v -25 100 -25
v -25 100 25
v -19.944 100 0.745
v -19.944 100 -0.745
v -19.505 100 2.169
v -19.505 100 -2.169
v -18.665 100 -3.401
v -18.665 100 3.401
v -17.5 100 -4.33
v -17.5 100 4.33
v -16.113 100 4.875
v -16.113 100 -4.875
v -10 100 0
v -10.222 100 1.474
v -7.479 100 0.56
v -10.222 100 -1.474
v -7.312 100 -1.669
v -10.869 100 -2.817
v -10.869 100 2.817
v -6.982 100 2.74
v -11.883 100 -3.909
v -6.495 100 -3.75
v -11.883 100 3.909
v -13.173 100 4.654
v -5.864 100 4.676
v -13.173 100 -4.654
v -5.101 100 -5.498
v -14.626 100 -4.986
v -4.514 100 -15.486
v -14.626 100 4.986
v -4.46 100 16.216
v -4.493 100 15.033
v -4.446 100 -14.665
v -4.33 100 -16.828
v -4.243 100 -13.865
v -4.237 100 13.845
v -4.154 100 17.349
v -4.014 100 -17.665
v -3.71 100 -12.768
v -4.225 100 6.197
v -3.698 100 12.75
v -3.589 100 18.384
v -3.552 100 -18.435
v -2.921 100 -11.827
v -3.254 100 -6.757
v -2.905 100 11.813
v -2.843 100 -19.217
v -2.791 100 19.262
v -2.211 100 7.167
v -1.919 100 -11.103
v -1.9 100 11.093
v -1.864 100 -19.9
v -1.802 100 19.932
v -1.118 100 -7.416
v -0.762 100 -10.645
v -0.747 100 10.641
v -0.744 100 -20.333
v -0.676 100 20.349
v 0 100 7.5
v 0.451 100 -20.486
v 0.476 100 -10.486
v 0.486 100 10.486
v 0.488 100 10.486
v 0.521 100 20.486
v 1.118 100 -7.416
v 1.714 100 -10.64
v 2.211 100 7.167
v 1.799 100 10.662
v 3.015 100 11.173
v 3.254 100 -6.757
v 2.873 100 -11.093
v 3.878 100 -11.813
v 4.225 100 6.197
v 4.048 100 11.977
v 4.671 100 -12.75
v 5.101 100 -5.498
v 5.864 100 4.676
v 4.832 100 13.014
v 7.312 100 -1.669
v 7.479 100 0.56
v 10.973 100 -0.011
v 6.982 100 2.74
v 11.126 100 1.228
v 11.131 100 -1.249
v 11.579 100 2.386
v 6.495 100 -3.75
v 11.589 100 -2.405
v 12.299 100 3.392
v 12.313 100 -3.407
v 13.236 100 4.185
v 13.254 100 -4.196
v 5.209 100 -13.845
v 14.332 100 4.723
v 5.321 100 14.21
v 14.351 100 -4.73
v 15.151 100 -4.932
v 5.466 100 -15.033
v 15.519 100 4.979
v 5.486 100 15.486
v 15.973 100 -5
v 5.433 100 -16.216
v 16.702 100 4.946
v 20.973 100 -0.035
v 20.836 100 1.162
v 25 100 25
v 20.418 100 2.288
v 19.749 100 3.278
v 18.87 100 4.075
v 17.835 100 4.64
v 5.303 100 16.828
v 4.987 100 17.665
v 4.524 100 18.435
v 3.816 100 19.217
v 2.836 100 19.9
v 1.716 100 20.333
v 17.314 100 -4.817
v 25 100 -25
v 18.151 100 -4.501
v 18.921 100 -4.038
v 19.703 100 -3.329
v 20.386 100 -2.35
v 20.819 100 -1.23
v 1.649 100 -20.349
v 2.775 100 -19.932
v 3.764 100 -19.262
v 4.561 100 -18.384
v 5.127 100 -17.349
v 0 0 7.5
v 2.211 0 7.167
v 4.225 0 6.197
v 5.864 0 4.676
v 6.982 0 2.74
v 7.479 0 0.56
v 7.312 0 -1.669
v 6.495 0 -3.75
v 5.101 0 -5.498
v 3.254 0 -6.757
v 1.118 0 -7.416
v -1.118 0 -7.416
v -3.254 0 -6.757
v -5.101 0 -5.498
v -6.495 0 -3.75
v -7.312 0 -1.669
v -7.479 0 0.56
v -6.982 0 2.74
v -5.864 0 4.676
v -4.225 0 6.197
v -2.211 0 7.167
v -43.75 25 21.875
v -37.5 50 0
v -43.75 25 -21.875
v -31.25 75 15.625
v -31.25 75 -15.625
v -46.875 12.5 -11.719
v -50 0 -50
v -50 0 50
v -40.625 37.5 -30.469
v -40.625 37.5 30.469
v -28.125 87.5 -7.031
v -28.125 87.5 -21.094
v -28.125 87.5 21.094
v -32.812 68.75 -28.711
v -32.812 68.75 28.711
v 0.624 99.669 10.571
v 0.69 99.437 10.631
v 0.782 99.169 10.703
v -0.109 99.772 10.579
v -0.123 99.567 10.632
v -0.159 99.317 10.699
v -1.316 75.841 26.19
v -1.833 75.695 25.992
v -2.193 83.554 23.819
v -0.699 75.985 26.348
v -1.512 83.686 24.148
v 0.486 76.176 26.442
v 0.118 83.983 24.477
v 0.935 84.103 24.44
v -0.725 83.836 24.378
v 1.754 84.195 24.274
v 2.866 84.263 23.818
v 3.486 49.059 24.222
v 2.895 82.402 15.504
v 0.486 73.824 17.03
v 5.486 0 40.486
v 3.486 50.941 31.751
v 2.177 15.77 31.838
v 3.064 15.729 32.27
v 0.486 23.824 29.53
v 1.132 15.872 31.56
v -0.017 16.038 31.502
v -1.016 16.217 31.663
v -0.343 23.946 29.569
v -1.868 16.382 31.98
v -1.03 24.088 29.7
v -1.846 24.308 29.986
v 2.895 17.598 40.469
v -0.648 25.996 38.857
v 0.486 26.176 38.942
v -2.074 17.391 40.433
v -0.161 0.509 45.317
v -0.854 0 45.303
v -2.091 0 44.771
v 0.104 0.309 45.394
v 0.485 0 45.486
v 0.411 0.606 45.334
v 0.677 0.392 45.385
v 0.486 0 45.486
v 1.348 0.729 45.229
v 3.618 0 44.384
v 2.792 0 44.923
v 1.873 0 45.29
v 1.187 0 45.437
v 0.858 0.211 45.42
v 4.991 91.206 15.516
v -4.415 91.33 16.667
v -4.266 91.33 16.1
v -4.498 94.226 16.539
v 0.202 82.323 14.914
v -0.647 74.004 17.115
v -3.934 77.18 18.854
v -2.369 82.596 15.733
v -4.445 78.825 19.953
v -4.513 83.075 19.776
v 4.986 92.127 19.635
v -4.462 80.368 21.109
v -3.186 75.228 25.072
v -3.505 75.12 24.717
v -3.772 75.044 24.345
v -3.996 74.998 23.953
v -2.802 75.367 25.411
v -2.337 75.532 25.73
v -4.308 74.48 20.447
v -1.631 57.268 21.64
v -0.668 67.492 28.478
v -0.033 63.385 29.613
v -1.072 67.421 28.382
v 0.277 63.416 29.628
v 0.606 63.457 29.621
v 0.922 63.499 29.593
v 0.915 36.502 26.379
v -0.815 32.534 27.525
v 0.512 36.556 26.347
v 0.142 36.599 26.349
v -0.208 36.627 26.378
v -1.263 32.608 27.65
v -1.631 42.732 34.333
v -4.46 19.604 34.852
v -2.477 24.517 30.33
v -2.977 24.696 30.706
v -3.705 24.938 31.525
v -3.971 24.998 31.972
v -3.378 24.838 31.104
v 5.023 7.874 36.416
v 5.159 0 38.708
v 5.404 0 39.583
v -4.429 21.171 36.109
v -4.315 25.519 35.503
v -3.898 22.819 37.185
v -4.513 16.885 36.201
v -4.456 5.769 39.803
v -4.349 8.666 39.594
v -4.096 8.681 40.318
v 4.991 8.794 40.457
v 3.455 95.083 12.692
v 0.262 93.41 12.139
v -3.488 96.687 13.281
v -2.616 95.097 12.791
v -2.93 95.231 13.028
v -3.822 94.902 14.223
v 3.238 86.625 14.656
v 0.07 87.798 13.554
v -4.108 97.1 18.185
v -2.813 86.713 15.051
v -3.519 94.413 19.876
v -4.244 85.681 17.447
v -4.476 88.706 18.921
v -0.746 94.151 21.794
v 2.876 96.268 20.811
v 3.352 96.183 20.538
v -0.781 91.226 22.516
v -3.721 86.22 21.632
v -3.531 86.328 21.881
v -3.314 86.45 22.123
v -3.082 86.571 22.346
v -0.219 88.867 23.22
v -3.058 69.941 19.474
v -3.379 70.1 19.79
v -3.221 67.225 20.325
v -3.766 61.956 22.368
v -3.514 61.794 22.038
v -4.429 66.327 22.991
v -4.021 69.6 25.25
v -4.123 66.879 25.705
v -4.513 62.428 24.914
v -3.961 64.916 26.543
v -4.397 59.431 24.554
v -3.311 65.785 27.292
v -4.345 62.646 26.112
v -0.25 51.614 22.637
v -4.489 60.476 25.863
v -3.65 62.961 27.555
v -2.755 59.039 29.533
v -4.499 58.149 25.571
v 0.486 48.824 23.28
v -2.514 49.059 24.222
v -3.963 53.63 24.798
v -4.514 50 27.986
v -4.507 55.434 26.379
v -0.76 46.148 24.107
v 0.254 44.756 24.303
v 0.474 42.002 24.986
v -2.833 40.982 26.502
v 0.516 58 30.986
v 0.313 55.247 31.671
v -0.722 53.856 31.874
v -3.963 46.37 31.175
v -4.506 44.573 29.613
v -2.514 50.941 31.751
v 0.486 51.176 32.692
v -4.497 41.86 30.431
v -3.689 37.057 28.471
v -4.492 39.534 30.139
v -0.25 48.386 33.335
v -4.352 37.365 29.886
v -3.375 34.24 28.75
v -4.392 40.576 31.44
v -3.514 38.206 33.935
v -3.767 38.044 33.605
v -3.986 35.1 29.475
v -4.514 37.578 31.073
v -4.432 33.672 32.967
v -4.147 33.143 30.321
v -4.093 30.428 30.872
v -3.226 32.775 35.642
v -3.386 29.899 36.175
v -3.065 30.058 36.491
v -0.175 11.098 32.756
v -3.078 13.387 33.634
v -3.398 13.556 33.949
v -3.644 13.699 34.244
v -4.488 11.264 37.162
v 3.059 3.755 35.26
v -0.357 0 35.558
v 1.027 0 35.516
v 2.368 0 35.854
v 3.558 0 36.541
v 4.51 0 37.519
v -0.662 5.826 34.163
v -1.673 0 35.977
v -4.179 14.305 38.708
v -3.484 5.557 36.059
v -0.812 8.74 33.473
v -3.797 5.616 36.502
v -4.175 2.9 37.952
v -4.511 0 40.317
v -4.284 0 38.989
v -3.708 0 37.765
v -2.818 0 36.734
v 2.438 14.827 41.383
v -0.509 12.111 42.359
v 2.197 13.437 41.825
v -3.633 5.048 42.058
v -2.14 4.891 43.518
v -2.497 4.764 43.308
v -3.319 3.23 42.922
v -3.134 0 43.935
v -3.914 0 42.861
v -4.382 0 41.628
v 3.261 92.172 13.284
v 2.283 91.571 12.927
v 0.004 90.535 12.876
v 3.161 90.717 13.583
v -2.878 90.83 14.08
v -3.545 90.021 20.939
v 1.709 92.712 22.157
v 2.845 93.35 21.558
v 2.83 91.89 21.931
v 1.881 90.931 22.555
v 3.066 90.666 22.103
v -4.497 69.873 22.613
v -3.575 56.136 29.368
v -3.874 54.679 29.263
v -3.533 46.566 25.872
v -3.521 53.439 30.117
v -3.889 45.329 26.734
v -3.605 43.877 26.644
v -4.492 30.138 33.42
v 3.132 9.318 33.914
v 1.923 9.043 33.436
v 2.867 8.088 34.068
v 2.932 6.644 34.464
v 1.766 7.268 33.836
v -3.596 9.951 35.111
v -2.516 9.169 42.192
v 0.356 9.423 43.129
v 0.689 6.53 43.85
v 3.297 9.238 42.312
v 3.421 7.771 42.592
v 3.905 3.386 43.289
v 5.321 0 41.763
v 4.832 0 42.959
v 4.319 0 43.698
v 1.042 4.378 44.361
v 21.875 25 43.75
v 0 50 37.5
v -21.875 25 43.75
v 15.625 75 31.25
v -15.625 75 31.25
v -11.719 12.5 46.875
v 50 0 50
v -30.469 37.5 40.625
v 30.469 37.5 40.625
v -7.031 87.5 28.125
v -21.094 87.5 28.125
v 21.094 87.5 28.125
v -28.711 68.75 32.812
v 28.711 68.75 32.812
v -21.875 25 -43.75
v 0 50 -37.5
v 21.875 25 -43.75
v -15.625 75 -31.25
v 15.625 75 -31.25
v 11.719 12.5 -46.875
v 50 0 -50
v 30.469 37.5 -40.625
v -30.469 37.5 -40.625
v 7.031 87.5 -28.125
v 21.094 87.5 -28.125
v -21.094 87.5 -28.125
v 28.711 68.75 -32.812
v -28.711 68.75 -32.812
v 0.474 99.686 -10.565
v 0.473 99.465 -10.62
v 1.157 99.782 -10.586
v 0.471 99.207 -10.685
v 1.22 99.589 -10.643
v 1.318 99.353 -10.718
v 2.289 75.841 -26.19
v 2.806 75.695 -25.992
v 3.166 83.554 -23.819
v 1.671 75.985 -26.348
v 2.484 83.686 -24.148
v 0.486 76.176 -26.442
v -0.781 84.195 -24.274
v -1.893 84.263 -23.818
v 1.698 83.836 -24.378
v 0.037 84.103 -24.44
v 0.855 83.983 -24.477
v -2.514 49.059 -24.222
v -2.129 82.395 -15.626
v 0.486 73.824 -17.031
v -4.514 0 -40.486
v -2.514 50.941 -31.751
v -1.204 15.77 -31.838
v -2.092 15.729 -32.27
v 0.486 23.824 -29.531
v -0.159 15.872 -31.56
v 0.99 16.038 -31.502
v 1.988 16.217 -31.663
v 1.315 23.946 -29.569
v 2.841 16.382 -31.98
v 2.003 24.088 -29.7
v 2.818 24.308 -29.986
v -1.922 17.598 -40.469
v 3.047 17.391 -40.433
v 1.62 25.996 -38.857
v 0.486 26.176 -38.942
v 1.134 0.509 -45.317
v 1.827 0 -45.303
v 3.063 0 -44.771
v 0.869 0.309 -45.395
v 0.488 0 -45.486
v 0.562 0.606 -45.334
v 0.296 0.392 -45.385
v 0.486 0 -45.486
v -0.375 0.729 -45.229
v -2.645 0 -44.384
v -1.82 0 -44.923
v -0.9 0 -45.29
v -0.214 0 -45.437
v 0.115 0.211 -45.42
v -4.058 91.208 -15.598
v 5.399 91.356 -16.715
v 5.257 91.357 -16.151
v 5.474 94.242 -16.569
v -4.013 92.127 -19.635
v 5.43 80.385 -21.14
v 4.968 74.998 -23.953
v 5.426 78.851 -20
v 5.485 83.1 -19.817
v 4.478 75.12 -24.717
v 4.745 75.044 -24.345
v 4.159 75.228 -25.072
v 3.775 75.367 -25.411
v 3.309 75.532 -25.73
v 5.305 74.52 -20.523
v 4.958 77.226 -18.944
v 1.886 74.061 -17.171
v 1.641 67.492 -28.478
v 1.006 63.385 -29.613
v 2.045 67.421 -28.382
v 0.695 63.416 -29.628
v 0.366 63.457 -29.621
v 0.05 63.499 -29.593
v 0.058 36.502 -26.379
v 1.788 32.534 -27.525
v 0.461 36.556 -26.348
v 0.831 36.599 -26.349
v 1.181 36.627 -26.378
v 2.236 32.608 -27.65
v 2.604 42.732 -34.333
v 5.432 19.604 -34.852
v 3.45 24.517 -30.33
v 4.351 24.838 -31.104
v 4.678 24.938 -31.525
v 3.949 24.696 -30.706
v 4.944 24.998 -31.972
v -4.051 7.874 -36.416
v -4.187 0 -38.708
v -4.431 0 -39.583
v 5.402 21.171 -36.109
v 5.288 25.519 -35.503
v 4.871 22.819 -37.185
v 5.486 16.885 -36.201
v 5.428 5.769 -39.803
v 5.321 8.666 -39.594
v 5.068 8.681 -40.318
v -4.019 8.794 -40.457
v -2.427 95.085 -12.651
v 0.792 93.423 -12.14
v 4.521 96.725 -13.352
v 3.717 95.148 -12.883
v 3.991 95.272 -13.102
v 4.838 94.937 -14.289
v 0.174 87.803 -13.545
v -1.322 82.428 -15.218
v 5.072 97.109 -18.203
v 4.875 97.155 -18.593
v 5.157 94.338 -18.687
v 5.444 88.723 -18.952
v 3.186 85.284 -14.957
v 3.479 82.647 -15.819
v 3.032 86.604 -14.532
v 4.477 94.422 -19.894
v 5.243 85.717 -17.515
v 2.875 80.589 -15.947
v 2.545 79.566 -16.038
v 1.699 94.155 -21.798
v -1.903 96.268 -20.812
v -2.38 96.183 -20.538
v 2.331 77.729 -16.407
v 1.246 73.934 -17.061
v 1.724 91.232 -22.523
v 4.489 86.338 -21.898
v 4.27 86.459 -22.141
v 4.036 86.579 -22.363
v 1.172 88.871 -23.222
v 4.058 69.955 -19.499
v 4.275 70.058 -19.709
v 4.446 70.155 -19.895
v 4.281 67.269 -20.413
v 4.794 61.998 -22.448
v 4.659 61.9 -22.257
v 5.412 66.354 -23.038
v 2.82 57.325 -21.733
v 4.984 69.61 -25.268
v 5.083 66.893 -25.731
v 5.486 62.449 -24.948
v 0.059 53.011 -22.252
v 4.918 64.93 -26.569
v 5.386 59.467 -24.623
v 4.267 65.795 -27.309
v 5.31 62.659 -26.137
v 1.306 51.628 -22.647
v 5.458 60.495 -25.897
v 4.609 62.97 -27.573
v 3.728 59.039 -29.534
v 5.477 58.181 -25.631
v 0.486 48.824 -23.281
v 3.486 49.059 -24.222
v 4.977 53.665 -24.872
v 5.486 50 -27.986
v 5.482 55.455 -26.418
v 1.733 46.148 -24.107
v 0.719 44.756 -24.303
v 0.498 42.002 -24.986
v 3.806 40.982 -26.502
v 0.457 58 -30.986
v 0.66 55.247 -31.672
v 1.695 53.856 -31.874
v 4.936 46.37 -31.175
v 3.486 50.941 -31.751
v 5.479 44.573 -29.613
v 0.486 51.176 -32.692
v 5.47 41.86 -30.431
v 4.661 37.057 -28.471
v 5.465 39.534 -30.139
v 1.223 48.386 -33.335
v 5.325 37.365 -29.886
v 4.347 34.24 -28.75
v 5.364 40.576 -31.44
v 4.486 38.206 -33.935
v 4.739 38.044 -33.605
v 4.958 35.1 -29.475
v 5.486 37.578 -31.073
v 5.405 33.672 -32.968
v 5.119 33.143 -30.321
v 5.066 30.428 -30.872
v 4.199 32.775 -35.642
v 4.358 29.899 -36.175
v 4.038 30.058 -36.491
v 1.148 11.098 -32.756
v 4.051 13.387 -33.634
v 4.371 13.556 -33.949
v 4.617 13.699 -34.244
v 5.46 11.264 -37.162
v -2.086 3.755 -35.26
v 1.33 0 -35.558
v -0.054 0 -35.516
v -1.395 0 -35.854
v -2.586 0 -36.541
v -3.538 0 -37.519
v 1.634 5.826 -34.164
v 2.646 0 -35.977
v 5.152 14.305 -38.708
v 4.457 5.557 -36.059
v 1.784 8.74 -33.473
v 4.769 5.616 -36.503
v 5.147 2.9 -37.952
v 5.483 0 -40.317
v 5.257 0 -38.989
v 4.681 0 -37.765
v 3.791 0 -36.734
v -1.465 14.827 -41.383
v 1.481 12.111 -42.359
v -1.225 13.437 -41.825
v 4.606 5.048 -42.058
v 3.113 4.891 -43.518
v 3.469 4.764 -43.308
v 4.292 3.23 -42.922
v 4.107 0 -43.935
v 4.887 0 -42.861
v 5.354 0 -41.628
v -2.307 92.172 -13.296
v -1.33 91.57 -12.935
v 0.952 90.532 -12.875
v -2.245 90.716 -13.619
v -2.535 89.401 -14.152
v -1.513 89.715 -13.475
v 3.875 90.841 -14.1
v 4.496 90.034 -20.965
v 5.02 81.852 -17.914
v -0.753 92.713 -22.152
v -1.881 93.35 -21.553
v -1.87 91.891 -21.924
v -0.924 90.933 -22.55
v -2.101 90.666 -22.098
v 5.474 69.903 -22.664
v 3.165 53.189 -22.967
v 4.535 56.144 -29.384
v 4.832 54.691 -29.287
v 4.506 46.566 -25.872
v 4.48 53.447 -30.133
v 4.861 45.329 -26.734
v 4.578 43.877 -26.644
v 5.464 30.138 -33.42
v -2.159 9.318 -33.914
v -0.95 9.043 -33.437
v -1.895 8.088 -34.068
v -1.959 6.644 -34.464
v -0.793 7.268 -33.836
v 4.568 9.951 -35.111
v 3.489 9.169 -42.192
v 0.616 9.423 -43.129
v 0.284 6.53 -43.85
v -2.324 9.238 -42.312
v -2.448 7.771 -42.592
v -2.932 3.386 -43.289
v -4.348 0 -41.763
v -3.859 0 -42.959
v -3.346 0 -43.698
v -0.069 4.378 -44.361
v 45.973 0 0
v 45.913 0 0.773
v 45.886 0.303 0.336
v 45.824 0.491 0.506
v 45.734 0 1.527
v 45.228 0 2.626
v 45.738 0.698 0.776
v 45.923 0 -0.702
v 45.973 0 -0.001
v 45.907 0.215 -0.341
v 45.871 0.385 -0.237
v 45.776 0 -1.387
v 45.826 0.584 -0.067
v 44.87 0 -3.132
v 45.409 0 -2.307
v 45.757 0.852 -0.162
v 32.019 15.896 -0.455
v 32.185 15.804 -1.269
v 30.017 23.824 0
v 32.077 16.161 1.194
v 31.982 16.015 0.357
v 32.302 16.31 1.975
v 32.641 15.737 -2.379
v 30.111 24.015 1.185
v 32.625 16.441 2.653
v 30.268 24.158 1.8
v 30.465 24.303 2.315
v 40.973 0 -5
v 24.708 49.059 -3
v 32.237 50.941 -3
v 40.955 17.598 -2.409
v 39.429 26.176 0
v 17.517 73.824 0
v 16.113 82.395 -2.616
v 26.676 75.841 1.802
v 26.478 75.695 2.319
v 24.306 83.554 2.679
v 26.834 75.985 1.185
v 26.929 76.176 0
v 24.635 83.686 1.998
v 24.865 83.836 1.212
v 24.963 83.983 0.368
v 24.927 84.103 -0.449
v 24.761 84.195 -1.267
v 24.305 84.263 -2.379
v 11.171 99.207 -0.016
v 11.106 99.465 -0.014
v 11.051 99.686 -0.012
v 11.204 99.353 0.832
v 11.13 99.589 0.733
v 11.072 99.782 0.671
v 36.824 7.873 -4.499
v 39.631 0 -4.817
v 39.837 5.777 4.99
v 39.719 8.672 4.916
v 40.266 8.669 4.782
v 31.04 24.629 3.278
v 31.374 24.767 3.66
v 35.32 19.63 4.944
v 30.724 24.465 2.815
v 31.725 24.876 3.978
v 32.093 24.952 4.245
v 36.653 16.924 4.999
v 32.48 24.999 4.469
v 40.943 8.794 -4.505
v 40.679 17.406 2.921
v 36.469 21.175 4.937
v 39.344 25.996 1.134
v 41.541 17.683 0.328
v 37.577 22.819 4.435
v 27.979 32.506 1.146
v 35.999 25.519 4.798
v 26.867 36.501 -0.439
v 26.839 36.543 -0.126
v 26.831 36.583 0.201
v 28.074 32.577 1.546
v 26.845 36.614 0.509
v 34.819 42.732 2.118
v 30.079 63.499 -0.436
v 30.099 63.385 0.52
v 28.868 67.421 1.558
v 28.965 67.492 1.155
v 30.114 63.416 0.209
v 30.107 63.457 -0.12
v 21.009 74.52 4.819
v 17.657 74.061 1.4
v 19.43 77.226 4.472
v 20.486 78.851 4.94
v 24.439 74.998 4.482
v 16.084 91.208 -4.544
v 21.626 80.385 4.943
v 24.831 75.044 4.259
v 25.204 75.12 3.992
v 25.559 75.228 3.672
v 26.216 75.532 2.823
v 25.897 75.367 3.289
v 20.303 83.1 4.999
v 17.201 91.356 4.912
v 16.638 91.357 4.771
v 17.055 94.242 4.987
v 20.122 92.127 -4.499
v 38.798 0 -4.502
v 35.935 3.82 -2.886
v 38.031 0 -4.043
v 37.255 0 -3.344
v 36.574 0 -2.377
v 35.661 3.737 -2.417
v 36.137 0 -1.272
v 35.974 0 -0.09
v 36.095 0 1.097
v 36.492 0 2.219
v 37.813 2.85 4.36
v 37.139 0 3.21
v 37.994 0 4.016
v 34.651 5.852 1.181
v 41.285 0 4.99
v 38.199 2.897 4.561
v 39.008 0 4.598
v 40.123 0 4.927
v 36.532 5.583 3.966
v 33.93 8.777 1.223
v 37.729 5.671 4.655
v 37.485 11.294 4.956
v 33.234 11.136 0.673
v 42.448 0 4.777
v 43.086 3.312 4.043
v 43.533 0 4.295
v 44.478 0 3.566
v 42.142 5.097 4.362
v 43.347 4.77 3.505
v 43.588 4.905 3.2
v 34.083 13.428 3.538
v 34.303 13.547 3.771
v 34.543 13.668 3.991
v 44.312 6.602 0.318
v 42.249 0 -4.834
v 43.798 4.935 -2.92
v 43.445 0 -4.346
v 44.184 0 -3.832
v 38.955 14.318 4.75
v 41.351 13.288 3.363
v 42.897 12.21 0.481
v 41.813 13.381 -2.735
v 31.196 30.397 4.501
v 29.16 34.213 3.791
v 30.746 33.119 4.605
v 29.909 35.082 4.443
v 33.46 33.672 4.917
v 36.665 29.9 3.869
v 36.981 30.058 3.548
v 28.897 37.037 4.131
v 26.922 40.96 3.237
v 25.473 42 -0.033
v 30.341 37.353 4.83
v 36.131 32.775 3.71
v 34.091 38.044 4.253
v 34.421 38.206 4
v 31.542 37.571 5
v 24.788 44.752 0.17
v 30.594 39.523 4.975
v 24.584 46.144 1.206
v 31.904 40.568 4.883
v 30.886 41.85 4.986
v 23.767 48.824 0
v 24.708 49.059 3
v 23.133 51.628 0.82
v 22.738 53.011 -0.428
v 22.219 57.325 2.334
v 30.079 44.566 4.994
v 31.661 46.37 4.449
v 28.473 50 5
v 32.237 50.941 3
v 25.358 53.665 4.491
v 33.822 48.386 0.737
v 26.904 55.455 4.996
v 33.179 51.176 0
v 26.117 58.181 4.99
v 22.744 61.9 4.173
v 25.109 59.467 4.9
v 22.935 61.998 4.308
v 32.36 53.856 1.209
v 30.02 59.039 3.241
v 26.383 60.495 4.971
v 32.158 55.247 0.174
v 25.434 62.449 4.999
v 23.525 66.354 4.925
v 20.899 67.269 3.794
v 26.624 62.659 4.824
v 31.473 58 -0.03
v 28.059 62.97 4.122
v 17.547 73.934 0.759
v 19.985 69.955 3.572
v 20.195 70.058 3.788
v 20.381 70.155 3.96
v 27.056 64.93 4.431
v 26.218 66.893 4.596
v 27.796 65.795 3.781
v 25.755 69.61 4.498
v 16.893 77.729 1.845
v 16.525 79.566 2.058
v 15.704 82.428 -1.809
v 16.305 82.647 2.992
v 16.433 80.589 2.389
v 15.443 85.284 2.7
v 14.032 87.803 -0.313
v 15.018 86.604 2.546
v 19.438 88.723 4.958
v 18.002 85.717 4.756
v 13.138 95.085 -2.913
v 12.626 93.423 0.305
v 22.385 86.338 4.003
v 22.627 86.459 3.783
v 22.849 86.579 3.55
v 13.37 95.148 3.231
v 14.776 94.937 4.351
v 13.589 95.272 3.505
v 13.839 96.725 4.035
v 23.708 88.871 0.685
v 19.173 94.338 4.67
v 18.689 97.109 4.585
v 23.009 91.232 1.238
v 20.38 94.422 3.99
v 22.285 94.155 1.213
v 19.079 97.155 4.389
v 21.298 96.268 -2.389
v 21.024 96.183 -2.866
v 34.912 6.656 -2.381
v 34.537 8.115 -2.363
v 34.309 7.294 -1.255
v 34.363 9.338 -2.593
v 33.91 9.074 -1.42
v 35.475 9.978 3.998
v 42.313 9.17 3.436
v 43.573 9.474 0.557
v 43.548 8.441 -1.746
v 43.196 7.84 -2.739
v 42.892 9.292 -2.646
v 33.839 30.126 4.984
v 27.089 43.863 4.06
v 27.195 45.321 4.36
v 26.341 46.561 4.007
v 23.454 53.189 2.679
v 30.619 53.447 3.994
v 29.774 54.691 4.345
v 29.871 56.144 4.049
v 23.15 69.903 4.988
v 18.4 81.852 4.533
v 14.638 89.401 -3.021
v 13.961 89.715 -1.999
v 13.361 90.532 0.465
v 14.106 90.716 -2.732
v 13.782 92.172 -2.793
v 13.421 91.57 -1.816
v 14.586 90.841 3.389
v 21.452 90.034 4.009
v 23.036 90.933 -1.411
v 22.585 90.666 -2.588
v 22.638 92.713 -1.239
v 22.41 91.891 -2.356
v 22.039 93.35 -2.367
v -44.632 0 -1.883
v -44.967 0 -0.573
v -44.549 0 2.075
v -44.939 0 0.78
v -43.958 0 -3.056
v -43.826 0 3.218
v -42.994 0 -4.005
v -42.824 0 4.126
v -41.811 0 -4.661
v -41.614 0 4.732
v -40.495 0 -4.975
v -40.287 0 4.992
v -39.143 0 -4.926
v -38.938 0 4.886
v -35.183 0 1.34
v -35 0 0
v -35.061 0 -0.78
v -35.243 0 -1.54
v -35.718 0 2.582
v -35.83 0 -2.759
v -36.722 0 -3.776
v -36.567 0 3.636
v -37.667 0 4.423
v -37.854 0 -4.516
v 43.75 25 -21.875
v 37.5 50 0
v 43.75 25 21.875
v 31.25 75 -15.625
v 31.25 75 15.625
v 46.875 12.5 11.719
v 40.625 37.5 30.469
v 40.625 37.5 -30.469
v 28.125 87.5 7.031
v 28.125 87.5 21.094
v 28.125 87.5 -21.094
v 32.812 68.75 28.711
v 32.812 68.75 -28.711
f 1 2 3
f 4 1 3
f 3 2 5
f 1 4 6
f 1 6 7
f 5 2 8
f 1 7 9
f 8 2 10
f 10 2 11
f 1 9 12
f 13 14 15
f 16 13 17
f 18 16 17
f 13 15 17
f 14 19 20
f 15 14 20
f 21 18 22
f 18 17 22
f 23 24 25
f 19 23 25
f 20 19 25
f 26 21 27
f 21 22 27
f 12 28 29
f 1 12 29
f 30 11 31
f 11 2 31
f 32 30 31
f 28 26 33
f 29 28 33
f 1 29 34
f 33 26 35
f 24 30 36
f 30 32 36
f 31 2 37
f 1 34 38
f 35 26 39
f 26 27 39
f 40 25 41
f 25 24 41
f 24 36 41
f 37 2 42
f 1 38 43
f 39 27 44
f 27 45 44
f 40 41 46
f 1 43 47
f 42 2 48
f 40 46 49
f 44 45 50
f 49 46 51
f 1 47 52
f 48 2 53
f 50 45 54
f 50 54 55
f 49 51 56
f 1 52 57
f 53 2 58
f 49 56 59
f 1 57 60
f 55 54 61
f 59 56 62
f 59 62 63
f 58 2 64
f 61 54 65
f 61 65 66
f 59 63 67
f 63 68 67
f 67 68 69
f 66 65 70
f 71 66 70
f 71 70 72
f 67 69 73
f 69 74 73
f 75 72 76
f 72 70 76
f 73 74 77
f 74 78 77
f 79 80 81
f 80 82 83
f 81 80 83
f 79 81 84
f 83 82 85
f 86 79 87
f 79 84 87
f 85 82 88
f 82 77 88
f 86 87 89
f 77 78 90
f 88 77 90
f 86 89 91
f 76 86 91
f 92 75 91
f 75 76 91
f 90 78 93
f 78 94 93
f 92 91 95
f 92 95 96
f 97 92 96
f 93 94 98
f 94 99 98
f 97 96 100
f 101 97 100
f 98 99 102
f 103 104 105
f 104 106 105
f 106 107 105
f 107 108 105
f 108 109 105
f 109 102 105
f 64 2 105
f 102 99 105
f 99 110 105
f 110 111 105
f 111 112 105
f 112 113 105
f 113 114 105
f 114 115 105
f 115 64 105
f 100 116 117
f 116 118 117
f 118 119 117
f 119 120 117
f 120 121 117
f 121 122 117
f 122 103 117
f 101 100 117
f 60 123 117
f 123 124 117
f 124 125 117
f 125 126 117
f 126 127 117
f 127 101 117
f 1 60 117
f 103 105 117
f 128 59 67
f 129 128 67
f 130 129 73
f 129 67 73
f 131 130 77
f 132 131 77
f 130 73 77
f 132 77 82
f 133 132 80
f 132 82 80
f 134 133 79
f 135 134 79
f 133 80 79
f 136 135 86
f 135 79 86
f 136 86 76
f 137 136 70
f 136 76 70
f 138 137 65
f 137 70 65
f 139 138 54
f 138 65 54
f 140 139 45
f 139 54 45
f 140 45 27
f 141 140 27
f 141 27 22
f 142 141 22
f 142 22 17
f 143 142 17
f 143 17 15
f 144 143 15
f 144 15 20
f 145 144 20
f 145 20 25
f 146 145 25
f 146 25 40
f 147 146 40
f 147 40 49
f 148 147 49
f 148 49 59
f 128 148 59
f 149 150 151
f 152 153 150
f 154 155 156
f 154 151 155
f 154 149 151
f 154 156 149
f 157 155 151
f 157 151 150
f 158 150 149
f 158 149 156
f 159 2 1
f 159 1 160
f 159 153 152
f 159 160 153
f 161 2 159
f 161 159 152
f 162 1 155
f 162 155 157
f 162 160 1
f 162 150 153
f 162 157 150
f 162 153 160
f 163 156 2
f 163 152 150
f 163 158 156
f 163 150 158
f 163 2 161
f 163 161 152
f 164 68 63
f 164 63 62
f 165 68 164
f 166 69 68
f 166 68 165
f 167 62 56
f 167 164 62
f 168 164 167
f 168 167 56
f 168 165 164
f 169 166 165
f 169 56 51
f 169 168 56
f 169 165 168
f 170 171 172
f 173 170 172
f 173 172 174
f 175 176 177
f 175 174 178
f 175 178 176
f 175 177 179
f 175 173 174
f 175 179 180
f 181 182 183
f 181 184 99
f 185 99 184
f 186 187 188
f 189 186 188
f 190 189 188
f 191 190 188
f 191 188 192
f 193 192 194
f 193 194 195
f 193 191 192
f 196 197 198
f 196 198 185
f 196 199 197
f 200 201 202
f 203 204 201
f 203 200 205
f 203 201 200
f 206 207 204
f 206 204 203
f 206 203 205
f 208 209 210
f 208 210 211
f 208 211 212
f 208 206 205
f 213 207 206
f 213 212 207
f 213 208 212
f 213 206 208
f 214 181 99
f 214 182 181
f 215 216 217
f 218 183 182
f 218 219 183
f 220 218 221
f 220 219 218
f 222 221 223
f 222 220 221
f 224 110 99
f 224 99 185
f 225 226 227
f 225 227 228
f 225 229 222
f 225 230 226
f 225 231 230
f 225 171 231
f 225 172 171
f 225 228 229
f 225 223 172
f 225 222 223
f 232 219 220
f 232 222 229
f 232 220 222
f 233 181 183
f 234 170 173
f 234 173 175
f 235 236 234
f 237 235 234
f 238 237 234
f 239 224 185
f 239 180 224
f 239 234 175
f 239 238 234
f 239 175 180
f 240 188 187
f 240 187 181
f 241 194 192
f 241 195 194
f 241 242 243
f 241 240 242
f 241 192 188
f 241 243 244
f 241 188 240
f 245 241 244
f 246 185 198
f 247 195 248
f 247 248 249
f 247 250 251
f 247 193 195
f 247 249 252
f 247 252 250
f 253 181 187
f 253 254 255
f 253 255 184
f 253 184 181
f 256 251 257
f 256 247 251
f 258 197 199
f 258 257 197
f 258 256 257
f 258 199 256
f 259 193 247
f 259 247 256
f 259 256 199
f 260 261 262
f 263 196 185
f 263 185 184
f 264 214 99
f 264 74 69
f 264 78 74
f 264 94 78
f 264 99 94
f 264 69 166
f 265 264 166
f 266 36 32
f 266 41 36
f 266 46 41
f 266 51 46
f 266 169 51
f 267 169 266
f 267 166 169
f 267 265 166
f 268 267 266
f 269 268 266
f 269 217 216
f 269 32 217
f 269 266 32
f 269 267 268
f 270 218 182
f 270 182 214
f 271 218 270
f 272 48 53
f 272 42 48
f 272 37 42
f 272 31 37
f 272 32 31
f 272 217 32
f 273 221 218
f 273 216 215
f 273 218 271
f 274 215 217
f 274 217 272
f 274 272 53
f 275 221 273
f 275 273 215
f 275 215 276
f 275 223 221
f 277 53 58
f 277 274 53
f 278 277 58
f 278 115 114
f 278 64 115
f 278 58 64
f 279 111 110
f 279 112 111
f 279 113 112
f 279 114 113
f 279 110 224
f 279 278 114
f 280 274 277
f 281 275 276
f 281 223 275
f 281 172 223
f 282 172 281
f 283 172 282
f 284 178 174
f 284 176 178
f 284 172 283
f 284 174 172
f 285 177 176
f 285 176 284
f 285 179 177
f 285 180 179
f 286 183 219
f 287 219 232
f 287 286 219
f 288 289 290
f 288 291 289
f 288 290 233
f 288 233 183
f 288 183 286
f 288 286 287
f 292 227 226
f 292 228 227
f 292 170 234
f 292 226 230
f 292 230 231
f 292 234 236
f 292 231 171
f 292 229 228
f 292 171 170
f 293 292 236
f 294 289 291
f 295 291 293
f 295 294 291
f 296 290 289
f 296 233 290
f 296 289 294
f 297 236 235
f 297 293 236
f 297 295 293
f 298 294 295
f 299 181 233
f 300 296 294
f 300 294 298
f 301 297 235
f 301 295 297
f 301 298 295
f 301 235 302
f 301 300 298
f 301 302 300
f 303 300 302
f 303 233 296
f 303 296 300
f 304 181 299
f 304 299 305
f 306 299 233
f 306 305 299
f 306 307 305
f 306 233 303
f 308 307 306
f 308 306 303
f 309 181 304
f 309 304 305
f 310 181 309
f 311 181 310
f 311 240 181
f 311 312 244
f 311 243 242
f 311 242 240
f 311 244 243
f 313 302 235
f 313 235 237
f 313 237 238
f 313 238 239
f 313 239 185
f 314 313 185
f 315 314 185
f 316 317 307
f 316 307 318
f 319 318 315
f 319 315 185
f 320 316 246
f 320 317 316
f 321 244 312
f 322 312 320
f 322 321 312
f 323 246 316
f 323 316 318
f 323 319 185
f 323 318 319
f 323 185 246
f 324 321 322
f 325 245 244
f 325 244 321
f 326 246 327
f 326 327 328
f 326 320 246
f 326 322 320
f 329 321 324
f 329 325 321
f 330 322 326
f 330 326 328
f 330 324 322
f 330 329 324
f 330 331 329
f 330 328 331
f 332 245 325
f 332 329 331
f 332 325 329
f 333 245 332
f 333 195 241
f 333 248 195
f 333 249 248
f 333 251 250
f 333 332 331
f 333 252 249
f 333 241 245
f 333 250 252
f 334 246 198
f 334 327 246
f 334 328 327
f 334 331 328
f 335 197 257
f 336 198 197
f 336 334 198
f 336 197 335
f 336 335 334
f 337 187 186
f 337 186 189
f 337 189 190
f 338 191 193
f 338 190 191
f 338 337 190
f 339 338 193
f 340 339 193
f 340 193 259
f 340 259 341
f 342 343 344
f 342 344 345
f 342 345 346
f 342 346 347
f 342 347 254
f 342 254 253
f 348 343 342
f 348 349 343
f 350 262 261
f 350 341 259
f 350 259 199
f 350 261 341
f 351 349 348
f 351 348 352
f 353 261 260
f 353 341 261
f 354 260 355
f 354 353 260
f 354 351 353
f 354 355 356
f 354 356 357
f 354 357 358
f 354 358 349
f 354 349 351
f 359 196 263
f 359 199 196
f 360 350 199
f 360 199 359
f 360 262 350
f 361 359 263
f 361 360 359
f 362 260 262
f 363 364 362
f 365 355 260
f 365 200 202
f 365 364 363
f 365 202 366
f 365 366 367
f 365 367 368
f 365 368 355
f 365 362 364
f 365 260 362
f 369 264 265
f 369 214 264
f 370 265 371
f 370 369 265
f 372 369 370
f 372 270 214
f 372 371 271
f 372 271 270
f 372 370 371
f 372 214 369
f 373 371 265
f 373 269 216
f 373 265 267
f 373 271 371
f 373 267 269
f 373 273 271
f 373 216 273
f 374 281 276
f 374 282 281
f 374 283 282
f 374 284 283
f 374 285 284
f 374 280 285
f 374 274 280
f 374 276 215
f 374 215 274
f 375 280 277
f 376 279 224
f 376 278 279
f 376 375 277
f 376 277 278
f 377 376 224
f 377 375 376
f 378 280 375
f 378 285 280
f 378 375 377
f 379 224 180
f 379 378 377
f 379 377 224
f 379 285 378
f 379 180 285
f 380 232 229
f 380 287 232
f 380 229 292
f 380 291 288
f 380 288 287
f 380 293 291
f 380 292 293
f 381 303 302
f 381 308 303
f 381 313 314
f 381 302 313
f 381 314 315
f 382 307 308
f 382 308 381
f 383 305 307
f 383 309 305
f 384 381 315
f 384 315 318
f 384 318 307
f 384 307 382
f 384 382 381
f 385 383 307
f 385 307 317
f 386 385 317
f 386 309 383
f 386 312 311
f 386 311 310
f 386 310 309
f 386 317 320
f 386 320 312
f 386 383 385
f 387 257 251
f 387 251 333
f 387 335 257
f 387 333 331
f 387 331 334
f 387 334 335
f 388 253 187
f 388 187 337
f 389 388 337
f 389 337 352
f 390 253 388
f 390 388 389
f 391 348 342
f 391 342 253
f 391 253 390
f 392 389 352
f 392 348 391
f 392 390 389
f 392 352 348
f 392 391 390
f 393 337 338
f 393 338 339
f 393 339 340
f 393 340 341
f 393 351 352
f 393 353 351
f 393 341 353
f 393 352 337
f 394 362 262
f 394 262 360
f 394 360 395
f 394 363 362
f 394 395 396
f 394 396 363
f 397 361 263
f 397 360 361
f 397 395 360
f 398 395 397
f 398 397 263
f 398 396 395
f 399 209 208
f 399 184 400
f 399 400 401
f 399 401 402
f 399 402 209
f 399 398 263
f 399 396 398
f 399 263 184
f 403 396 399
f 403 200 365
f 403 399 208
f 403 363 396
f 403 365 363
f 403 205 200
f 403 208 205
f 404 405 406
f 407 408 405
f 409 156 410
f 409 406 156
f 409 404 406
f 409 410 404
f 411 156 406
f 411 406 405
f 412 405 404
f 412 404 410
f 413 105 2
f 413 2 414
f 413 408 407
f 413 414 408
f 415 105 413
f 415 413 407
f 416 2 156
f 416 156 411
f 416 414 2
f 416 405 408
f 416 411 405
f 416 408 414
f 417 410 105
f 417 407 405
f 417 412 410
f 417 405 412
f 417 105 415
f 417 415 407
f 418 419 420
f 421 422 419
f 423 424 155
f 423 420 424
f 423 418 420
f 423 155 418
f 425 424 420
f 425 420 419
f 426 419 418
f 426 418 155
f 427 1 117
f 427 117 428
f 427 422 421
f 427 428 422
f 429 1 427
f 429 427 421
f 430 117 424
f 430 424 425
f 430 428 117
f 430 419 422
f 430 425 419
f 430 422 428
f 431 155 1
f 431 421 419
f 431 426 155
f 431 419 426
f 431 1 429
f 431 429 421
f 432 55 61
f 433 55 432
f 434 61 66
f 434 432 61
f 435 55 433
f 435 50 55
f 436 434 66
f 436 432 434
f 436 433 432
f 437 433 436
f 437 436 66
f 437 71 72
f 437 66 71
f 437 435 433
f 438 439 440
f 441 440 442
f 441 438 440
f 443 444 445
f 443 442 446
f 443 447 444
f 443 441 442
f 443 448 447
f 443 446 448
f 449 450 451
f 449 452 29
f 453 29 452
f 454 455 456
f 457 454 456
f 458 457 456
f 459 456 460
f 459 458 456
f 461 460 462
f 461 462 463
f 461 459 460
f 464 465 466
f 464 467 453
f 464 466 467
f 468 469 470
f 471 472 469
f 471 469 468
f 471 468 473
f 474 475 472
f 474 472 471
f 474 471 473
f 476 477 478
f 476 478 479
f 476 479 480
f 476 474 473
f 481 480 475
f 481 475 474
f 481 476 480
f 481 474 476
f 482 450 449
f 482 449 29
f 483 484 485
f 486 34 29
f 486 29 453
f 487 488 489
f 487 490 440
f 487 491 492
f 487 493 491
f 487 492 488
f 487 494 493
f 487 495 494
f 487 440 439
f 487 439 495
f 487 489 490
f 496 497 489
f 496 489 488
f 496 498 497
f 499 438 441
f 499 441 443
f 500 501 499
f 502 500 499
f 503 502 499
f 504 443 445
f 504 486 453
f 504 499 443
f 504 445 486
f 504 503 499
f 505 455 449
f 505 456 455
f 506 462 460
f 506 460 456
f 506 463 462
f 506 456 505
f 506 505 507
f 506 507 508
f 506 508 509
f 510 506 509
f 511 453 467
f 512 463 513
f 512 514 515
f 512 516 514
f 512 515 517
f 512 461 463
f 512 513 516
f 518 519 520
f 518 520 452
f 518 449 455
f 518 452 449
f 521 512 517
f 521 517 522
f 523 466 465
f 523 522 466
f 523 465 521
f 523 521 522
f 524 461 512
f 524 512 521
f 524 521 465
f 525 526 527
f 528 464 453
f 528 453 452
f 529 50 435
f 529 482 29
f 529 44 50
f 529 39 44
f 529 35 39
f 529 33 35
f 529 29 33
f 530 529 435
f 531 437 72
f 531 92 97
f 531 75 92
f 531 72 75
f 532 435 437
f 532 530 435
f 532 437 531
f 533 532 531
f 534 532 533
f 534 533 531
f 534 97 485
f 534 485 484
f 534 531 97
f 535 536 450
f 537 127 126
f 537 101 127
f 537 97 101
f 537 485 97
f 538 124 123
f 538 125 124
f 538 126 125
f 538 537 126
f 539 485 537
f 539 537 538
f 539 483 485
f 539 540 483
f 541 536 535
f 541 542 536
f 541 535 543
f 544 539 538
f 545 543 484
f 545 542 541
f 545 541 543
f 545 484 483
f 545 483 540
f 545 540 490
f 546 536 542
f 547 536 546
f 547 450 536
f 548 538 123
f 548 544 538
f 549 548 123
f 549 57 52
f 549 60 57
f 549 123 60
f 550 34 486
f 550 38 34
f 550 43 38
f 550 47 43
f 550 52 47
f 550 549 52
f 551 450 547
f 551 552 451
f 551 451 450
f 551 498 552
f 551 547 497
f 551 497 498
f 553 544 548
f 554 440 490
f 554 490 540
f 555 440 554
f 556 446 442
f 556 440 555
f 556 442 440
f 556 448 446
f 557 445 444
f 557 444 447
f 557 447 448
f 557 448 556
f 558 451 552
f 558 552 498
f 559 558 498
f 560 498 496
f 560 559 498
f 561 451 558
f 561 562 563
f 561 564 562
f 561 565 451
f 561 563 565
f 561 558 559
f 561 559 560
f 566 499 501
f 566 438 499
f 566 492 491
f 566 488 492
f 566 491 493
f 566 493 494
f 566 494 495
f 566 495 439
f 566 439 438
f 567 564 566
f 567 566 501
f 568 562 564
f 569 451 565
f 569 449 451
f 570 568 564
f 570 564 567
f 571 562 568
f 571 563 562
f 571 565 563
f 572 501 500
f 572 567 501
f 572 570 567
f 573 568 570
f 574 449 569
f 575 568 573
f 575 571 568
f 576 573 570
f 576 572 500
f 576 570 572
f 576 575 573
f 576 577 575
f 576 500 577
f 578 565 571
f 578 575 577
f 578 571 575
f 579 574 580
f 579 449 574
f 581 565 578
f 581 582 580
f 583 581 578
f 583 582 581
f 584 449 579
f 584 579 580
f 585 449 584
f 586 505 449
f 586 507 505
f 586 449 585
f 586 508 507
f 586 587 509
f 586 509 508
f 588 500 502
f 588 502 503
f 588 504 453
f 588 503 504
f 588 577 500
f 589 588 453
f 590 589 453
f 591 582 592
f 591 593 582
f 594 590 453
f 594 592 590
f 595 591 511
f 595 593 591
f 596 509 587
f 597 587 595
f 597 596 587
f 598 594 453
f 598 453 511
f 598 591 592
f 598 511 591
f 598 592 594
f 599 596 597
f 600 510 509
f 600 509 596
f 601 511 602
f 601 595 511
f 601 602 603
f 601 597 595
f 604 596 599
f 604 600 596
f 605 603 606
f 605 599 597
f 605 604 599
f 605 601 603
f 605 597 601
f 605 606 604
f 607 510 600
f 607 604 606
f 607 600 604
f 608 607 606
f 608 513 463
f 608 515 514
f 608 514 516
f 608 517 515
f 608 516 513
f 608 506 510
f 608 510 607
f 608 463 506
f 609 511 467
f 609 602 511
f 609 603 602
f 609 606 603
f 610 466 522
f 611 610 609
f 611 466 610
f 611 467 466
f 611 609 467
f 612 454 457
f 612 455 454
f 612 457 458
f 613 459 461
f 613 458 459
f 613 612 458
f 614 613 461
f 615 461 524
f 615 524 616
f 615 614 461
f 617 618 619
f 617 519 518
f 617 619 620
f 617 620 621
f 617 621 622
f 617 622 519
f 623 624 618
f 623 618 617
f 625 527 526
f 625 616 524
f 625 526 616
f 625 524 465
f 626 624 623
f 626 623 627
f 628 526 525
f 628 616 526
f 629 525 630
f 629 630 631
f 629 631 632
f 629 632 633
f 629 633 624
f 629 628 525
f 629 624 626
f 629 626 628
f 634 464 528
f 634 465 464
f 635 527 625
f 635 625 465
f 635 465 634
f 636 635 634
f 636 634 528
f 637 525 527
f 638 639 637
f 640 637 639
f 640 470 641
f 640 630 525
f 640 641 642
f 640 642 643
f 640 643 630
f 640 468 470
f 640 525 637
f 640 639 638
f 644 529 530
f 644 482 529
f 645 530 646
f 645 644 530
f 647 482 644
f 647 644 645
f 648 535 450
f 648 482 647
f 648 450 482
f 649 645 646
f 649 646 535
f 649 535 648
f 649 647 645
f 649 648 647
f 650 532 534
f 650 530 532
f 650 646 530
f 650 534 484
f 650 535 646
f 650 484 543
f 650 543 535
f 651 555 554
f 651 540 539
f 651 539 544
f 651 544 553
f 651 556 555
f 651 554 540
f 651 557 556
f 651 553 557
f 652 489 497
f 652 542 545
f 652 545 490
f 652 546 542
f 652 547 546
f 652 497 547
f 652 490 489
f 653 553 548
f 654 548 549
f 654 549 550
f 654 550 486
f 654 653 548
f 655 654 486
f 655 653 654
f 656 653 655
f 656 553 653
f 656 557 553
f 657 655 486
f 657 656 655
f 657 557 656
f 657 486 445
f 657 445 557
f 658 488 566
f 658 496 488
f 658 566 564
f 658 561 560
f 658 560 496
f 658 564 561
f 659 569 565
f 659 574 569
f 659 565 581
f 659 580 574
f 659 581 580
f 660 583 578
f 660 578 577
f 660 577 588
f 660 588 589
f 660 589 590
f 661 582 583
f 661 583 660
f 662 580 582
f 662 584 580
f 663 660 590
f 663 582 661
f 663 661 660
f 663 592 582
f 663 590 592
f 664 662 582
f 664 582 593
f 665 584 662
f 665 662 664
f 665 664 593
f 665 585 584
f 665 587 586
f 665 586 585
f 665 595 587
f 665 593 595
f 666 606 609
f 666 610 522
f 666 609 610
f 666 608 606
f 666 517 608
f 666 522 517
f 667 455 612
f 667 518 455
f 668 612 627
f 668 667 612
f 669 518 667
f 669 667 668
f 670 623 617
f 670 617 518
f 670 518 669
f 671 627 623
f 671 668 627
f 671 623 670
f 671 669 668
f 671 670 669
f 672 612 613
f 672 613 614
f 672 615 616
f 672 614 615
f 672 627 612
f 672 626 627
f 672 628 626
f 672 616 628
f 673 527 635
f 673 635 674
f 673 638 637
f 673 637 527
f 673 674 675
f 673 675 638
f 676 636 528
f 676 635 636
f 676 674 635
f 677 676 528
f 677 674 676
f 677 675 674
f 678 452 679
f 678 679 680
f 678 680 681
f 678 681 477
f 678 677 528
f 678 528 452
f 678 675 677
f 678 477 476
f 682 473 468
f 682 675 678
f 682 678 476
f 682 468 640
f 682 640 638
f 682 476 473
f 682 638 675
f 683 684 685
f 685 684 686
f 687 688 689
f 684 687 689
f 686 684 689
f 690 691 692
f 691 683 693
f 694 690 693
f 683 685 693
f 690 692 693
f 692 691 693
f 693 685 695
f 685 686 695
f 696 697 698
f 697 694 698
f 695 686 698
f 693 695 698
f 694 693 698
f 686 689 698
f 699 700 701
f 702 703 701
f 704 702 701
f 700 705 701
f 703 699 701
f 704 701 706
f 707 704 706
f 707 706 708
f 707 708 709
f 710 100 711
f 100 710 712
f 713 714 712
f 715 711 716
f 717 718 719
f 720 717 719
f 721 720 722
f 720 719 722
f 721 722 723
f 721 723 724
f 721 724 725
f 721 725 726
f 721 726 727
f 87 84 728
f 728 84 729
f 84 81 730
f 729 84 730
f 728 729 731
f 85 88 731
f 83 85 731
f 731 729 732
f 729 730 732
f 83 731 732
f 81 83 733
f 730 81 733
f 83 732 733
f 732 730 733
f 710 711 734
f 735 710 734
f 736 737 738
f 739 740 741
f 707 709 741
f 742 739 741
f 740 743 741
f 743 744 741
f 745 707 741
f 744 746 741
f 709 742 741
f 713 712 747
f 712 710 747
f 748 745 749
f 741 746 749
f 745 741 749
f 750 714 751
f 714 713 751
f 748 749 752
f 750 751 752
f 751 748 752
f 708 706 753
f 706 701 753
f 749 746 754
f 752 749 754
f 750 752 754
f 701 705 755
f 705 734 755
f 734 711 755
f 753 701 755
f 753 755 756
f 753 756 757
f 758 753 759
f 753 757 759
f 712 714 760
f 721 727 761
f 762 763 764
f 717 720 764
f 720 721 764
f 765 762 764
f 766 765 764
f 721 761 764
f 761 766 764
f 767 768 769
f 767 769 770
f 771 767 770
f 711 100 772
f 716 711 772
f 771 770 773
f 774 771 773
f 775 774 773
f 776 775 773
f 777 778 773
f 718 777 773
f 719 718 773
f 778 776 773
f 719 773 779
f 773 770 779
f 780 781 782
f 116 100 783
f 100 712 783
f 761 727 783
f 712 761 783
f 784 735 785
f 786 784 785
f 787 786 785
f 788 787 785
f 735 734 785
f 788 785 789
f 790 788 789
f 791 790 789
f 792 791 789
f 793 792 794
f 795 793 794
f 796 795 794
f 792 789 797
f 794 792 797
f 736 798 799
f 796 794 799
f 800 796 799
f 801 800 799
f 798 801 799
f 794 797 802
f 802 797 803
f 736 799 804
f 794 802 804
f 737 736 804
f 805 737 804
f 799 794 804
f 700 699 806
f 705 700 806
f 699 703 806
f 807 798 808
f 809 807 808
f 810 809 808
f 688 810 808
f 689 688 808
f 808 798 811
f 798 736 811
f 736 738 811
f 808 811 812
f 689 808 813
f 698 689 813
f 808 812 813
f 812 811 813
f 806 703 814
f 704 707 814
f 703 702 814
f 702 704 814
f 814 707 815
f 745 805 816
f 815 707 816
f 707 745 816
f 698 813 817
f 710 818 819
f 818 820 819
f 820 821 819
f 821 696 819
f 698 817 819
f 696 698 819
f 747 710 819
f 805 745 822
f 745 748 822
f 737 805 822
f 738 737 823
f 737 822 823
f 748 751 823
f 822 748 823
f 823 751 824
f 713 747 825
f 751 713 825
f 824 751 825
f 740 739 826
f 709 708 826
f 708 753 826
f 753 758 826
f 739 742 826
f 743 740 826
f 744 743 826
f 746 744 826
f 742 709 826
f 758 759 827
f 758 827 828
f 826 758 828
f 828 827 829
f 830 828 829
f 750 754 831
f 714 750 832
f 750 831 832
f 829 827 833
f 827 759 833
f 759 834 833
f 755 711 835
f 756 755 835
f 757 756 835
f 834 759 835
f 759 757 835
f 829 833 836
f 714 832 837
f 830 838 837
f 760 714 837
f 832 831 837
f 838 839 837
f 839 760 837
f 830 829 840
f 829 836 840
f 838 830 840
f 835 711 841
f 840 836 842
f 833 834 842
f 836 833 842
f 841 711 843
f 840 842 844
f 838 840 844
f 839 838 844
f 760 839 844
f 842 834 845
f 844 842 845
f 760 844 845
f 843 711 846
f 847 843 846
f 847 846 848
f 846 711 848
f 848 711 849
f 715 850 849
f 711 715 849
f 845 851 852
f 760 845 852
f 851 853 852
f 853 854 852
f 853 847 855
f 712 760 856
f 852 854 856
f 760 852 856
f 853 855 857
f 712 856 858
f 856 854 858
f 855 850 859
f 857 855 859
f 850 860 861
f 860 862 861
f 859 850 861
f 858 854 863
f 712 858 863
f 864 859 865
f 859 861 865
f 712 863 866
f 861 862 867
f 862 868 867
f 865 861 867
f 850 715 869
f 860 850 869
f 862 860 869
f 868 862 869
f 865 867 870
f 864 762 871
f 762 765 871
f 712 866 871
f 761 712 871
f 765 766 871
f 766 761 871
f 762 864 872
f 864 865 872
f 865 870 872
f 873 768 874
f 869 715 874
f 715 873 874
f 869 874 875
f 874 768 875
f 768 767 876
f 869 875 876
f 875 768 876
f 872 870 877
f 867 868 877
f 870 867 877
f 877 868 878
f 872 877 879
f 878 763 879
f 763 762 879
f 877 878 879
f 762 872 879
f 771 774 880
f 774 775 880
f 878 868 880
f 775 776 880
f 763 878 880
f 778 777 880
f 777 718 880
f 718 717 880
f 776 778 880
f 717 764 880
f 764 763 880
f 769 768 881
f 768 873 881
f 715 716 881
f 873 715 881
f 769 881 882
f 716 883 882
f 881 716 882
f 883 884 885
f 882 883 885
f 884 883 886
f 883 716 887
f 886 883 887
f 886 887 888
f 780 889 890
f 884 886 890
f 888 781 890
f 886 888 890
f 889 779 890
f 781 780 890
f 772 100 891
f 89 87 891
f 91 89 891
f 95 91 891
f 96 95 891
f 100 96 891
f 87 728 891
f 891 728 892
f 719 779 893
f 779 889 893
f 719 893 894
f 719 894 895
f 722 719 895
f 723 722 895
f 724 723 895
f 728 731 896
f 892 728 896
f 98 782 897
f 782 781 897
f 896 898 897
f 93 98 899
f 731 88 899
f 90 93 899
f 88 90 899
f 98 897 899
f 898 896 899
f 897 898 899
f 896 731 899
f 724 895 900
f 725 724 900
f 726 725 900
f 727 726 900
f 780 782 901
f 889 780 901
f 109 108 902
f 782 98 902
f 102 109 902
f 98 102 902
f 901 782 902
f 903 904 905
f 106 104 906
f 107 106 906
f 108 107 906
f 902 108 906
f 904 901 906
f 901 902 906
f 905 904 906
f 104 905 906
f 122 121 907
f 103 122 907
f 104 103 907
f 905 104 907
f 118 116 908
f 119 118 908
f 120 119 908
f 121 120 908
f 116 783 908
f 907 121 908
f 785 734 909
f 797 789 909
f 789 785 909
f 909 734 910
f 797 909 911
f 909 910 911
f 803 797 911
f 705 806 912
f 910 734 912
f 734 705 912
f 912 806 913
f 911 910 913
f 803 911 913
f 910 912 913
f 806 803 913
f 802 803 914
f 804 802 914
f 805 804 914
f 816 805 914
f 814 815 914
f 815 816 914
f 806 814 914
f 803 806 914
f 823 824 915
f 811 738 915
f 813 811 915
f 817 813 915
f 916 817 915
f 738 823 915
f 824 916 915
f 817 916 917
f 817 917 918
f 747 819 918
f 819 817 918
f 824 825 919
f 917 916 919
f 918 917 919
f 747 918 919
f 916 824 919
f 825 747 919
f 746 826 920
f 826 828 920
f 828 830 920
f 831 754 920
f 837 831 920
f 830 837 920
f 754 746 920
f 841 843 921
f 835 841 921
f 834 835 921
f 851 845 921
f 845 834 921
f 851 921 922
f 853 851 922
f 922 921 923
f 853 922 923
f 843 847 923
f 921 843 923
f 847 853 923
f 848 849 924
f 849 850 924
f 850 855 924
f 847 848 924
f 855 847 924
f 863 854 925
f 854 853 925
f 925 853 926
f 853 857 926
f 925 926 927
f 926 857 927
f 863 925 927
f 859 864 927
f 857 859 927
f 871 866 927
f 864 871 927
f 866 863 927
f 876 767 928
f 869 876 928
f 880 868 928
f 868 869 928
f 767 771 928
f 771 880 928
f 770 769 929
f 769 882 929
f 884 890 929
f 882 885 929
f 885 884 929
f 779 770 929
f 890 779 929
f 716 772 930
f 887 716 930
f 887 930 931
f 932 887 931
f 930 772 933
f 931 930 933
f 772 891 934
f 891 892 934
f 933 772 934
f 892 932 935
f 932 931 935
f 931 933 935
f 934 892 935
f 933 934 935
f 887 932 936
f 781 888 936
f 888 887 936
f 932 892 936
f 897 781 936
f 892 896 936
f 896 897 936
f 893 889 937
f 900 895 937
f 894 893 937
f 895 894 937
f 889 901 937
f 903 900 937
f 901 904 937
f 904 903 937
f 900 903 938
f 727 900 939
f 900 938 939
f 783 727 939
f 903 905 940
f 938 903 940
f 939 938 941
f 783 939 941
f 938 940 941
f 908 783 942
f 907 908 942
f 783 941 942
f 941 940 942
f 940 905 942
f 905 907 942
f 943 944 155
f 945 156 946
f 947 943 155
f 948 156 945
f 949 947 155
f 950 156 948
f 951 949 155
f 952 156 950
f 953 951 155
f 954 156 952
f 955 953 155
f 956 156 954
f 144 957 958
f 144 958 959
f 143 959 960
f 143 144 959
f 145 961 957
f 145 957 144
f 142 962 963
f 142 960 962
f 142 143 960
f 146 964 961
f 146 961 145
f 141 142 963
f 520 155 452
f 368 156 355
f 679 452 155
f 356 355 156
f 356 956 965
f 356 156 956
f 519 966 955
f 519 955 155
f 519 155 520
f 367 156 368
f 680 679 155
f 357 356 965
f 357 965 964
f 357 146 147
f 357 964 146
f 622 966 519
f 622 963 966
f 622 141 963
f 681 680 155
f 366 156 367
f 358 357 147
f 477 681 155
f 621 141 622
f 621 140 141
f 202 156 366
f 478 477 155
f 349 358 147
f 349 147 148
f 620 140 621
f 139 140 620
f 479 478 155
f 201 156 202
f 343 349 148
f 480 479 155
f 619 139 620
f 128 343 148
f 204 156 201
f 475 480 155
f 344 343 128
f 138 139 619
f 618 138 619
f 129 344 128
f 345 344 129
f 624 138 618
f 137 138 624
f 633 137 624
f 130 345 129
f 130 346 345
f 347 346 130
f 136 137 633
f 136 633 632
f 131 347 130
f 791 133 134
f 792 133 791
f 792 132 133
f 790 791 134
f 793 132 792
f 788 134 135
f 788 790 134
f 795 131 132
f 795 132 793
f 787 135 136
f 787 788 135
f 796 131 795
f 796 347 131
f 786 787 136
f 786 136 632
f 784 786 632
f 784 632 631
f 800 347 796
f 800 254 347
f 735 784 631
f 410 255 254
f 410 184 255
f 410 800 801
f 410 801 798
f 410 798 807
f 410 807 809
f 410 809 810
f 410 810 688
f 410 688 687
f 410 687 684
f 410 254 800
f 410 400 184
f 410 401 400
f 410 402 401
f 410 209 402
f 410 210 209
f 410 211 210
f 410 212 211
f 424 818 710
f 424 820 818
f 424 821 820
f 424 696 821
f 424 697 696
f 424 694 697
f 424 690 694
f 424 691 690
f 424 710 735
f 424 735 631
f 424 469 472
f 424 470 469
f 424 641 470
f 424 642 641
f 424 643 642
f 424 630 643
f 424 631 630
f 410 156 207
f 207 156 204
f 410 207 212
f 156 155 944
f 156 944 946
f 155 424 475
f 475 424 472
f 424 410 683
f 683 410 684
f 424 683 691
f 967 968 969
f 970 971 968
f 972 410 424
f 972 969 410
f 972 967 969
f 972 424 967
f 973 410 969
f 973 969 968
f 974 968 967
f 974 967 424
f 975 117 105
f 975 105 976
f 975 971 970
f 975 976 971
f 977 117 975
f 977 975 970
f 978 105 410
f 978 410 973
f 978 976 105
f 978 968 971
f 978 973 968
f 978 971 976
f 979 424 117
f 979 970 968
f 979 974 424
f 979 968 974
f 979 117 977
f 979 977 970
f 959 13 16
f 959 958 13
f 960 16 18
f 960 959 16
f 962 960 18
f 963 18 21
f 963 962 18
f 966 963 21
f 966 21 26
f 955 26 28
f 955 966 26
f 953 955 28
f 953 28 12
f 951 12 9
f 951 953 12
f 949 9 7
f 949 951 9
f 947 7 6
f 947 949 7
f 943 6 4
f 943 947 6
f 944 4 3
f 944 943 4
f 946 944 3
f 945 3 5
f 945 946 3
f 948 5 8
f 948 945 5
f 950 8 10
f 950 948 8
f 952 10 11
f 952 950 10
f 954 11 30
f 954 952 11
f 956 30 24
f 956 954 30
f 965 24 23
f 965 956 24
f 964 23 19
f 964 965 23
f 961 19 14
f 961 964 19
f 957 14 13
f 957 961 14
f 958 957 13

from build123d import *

# Parameters (mm, degrees)
SKETCH4_R           = 5
CIRPATTERN2_START   = -11.032054127
CIRPATTERN2_DEPTH   = 105.5029968
CIRPATTERN2_START_2 = -94.352977596
CIRPATTERN2_2_DEPTH = 105.502996925
CIRPATTERN2_START_3 = -11.032068283
CIRPATTERN2_3_DEPTH = 105.502996925
SKETCH9_R           = 7.5
CUT_EXTRUDE1_DEPTH  = 123.474487302


# Read off the part's stored shape, not the designer's step: CirPattern2
with BuildPart() as part:
    # Sketch1 → Loft1 section 0
    with BuildSketch(Plane(origin=(0, 0, 0), x_dir=(1, 0, 0), z_dir=(0, 1, 0))):
        with BuildLine():
            Line((-50, -50), (50, -50))
            Line((50, -50), (50, 50))
            Line((50, 50), (-50, 50))
            Line((-50, 50), (-50, -50))
        make_face()
    # Sketch2 → Loft1 section 1
    with BuildSketch(Plane(origin=(0, 100, 0), x_dir=(1, 0, 0), z_dir=(0, 1, 0))):
        with BuildLine():
            Line((-25, -25), (25, -25))
            Line((25, -25), (25, 25))
            Line((25, 25), (-25, 25))
            Line((-25, 25), (-25, -25))
        make_face()
    loft()

    # Cut-Sweep1: sweep along a path in Sketch6
    with BuildLine(Plane(origin=(-37.647058824, 9.411764706, 0), x_dir=(0, 0, 1), z_dir=(-0.9701425001453319, 0.24253562503633289, 0))) as cut_sweep1_path:
        Line((0, 93.376215639), (0, -33.366083353))
    # Sketch4 → Cut-Sweep1 (sweep, cut)
    with BuildSketch(Plane(origin=(0, 100, 0), x_dir=(1, 0, 0), z_dir=(0, 1, 0))):
        with Locations((-15, 0)):
            Circle(SKETCH4_R)
    sweep(path=cut_sweep1_path.line, mode=Mode.SUBTRACT)

    # CirPattern2 outline → CirPattern2 (cut)
    with BuildSketch(Plane(origin=(0, 0, 0), x_dir=(1, 0, 0), z_dir=(0, 0.970142500145332, -0.2425356250363331)).offset(CIRPATTERN2_START)):
        with BuildLine():
            add(Edge.make_bspline(
                [(5.486382989, -39.277504189), (5.486382989, -29.576079188), (-4.513617011, -29.576079188), (-4.513617011, -39.277504189), (-4.513617011, -48.97892919), (5.486382989, -48.97892919), (5.486382989, -39.277504189)],
                knots=[0, 0, 0, 0, 0.5, 0.5, 0.5, 1, 1, 1, 1], degree=3, weights=[1, 0.333333333, 0.333333333, 1, 0.333333333, 0.333333333, 1]))
        make_face()
    extrude(amount=CIRPATTERN2_DEPTH, mode=Mode.SUBTRACT)

    # CirPattern2 2 outline → CirPattern2 2 (cut)
    with BuildSketch(Plane(origin=(0, 0, 0), x_dir=(0.9701425001453318, 0.24253562503633344, 0), z_dir=(0.24253562503633344, -0.9701425001453318, 0)).offset(CIRPATTERN2_START_2)):
        with BuildLine():
            add(Edge.make_bspline(
                [(39.749364998, -5.000058368), (30.047939997, -5.000058368), (30.047939997, 4.999941632), (39.749364998, 4.999941632), (49.450789999, 4.999941632), (49.450789999, -5.000058368), (39.749364998, -5.000058368)],
                knots=[0, 0, 0, 0, 0.5, 0.5, 0.5, 1, 1, 1, 1], degree=3, weights=[1, 0.333333333, 0.333333333, 1, 0.333333333, 0.333333333, 1]))
        make_face()
    extrude(amount=CIRPATTERN2_2_DEPTH, mode=Mode.SUBTRACT)

    # CirPattern2 3 outline → CirPattern2 3 (cut)
    with BuildSketch(Plane(origin=(0, 0, 0), x_dir=(1, 0, 0), z_dir=(0, 0.9701425001453319, 0.24253562503633325)).offset(CIRPATTERN2_START_3)):
        with BuildLine():
            add(Edge.make_bspline(
                [(-4.513675379, 39.277560815), (-4.513675379, 29.576135813), (5.486324621, 29.576135813), (5.486324621, 39.277560815), (5.486324621, 48.978985816), (-4.513675379, 48.978985816), (-4.513675379, 39.277560815)],
                knots=[0, 0, 0, 0, 0.5, 0.5, 0.5, 1, 1, 1, 1], degree=3, weights=[1, 0.333333333, 0.333333333, 1, 0.333333333, 0.333333333, 1]))
        make_face()
    extrude(amount=CIRPATTERN2_3_DEPTH, mode=Mode.SUBTRACT)

    # Sketch9 → Cut-Extrude1 (cut, through all)
    with BuildSketch(Plane(origin=(0, 100, 0), x_dir=(1, 0, 0), z_dir=(0, 1, 0))):
        with Locations(Location((0, 0, 0), (0, 0, 270))):
            Circle(SKETCH9_R)
    extrude(amount=-CUT_EXTRUDE1_DEPTH, mode=Mode.SUBTRACT)


solid = part.part
